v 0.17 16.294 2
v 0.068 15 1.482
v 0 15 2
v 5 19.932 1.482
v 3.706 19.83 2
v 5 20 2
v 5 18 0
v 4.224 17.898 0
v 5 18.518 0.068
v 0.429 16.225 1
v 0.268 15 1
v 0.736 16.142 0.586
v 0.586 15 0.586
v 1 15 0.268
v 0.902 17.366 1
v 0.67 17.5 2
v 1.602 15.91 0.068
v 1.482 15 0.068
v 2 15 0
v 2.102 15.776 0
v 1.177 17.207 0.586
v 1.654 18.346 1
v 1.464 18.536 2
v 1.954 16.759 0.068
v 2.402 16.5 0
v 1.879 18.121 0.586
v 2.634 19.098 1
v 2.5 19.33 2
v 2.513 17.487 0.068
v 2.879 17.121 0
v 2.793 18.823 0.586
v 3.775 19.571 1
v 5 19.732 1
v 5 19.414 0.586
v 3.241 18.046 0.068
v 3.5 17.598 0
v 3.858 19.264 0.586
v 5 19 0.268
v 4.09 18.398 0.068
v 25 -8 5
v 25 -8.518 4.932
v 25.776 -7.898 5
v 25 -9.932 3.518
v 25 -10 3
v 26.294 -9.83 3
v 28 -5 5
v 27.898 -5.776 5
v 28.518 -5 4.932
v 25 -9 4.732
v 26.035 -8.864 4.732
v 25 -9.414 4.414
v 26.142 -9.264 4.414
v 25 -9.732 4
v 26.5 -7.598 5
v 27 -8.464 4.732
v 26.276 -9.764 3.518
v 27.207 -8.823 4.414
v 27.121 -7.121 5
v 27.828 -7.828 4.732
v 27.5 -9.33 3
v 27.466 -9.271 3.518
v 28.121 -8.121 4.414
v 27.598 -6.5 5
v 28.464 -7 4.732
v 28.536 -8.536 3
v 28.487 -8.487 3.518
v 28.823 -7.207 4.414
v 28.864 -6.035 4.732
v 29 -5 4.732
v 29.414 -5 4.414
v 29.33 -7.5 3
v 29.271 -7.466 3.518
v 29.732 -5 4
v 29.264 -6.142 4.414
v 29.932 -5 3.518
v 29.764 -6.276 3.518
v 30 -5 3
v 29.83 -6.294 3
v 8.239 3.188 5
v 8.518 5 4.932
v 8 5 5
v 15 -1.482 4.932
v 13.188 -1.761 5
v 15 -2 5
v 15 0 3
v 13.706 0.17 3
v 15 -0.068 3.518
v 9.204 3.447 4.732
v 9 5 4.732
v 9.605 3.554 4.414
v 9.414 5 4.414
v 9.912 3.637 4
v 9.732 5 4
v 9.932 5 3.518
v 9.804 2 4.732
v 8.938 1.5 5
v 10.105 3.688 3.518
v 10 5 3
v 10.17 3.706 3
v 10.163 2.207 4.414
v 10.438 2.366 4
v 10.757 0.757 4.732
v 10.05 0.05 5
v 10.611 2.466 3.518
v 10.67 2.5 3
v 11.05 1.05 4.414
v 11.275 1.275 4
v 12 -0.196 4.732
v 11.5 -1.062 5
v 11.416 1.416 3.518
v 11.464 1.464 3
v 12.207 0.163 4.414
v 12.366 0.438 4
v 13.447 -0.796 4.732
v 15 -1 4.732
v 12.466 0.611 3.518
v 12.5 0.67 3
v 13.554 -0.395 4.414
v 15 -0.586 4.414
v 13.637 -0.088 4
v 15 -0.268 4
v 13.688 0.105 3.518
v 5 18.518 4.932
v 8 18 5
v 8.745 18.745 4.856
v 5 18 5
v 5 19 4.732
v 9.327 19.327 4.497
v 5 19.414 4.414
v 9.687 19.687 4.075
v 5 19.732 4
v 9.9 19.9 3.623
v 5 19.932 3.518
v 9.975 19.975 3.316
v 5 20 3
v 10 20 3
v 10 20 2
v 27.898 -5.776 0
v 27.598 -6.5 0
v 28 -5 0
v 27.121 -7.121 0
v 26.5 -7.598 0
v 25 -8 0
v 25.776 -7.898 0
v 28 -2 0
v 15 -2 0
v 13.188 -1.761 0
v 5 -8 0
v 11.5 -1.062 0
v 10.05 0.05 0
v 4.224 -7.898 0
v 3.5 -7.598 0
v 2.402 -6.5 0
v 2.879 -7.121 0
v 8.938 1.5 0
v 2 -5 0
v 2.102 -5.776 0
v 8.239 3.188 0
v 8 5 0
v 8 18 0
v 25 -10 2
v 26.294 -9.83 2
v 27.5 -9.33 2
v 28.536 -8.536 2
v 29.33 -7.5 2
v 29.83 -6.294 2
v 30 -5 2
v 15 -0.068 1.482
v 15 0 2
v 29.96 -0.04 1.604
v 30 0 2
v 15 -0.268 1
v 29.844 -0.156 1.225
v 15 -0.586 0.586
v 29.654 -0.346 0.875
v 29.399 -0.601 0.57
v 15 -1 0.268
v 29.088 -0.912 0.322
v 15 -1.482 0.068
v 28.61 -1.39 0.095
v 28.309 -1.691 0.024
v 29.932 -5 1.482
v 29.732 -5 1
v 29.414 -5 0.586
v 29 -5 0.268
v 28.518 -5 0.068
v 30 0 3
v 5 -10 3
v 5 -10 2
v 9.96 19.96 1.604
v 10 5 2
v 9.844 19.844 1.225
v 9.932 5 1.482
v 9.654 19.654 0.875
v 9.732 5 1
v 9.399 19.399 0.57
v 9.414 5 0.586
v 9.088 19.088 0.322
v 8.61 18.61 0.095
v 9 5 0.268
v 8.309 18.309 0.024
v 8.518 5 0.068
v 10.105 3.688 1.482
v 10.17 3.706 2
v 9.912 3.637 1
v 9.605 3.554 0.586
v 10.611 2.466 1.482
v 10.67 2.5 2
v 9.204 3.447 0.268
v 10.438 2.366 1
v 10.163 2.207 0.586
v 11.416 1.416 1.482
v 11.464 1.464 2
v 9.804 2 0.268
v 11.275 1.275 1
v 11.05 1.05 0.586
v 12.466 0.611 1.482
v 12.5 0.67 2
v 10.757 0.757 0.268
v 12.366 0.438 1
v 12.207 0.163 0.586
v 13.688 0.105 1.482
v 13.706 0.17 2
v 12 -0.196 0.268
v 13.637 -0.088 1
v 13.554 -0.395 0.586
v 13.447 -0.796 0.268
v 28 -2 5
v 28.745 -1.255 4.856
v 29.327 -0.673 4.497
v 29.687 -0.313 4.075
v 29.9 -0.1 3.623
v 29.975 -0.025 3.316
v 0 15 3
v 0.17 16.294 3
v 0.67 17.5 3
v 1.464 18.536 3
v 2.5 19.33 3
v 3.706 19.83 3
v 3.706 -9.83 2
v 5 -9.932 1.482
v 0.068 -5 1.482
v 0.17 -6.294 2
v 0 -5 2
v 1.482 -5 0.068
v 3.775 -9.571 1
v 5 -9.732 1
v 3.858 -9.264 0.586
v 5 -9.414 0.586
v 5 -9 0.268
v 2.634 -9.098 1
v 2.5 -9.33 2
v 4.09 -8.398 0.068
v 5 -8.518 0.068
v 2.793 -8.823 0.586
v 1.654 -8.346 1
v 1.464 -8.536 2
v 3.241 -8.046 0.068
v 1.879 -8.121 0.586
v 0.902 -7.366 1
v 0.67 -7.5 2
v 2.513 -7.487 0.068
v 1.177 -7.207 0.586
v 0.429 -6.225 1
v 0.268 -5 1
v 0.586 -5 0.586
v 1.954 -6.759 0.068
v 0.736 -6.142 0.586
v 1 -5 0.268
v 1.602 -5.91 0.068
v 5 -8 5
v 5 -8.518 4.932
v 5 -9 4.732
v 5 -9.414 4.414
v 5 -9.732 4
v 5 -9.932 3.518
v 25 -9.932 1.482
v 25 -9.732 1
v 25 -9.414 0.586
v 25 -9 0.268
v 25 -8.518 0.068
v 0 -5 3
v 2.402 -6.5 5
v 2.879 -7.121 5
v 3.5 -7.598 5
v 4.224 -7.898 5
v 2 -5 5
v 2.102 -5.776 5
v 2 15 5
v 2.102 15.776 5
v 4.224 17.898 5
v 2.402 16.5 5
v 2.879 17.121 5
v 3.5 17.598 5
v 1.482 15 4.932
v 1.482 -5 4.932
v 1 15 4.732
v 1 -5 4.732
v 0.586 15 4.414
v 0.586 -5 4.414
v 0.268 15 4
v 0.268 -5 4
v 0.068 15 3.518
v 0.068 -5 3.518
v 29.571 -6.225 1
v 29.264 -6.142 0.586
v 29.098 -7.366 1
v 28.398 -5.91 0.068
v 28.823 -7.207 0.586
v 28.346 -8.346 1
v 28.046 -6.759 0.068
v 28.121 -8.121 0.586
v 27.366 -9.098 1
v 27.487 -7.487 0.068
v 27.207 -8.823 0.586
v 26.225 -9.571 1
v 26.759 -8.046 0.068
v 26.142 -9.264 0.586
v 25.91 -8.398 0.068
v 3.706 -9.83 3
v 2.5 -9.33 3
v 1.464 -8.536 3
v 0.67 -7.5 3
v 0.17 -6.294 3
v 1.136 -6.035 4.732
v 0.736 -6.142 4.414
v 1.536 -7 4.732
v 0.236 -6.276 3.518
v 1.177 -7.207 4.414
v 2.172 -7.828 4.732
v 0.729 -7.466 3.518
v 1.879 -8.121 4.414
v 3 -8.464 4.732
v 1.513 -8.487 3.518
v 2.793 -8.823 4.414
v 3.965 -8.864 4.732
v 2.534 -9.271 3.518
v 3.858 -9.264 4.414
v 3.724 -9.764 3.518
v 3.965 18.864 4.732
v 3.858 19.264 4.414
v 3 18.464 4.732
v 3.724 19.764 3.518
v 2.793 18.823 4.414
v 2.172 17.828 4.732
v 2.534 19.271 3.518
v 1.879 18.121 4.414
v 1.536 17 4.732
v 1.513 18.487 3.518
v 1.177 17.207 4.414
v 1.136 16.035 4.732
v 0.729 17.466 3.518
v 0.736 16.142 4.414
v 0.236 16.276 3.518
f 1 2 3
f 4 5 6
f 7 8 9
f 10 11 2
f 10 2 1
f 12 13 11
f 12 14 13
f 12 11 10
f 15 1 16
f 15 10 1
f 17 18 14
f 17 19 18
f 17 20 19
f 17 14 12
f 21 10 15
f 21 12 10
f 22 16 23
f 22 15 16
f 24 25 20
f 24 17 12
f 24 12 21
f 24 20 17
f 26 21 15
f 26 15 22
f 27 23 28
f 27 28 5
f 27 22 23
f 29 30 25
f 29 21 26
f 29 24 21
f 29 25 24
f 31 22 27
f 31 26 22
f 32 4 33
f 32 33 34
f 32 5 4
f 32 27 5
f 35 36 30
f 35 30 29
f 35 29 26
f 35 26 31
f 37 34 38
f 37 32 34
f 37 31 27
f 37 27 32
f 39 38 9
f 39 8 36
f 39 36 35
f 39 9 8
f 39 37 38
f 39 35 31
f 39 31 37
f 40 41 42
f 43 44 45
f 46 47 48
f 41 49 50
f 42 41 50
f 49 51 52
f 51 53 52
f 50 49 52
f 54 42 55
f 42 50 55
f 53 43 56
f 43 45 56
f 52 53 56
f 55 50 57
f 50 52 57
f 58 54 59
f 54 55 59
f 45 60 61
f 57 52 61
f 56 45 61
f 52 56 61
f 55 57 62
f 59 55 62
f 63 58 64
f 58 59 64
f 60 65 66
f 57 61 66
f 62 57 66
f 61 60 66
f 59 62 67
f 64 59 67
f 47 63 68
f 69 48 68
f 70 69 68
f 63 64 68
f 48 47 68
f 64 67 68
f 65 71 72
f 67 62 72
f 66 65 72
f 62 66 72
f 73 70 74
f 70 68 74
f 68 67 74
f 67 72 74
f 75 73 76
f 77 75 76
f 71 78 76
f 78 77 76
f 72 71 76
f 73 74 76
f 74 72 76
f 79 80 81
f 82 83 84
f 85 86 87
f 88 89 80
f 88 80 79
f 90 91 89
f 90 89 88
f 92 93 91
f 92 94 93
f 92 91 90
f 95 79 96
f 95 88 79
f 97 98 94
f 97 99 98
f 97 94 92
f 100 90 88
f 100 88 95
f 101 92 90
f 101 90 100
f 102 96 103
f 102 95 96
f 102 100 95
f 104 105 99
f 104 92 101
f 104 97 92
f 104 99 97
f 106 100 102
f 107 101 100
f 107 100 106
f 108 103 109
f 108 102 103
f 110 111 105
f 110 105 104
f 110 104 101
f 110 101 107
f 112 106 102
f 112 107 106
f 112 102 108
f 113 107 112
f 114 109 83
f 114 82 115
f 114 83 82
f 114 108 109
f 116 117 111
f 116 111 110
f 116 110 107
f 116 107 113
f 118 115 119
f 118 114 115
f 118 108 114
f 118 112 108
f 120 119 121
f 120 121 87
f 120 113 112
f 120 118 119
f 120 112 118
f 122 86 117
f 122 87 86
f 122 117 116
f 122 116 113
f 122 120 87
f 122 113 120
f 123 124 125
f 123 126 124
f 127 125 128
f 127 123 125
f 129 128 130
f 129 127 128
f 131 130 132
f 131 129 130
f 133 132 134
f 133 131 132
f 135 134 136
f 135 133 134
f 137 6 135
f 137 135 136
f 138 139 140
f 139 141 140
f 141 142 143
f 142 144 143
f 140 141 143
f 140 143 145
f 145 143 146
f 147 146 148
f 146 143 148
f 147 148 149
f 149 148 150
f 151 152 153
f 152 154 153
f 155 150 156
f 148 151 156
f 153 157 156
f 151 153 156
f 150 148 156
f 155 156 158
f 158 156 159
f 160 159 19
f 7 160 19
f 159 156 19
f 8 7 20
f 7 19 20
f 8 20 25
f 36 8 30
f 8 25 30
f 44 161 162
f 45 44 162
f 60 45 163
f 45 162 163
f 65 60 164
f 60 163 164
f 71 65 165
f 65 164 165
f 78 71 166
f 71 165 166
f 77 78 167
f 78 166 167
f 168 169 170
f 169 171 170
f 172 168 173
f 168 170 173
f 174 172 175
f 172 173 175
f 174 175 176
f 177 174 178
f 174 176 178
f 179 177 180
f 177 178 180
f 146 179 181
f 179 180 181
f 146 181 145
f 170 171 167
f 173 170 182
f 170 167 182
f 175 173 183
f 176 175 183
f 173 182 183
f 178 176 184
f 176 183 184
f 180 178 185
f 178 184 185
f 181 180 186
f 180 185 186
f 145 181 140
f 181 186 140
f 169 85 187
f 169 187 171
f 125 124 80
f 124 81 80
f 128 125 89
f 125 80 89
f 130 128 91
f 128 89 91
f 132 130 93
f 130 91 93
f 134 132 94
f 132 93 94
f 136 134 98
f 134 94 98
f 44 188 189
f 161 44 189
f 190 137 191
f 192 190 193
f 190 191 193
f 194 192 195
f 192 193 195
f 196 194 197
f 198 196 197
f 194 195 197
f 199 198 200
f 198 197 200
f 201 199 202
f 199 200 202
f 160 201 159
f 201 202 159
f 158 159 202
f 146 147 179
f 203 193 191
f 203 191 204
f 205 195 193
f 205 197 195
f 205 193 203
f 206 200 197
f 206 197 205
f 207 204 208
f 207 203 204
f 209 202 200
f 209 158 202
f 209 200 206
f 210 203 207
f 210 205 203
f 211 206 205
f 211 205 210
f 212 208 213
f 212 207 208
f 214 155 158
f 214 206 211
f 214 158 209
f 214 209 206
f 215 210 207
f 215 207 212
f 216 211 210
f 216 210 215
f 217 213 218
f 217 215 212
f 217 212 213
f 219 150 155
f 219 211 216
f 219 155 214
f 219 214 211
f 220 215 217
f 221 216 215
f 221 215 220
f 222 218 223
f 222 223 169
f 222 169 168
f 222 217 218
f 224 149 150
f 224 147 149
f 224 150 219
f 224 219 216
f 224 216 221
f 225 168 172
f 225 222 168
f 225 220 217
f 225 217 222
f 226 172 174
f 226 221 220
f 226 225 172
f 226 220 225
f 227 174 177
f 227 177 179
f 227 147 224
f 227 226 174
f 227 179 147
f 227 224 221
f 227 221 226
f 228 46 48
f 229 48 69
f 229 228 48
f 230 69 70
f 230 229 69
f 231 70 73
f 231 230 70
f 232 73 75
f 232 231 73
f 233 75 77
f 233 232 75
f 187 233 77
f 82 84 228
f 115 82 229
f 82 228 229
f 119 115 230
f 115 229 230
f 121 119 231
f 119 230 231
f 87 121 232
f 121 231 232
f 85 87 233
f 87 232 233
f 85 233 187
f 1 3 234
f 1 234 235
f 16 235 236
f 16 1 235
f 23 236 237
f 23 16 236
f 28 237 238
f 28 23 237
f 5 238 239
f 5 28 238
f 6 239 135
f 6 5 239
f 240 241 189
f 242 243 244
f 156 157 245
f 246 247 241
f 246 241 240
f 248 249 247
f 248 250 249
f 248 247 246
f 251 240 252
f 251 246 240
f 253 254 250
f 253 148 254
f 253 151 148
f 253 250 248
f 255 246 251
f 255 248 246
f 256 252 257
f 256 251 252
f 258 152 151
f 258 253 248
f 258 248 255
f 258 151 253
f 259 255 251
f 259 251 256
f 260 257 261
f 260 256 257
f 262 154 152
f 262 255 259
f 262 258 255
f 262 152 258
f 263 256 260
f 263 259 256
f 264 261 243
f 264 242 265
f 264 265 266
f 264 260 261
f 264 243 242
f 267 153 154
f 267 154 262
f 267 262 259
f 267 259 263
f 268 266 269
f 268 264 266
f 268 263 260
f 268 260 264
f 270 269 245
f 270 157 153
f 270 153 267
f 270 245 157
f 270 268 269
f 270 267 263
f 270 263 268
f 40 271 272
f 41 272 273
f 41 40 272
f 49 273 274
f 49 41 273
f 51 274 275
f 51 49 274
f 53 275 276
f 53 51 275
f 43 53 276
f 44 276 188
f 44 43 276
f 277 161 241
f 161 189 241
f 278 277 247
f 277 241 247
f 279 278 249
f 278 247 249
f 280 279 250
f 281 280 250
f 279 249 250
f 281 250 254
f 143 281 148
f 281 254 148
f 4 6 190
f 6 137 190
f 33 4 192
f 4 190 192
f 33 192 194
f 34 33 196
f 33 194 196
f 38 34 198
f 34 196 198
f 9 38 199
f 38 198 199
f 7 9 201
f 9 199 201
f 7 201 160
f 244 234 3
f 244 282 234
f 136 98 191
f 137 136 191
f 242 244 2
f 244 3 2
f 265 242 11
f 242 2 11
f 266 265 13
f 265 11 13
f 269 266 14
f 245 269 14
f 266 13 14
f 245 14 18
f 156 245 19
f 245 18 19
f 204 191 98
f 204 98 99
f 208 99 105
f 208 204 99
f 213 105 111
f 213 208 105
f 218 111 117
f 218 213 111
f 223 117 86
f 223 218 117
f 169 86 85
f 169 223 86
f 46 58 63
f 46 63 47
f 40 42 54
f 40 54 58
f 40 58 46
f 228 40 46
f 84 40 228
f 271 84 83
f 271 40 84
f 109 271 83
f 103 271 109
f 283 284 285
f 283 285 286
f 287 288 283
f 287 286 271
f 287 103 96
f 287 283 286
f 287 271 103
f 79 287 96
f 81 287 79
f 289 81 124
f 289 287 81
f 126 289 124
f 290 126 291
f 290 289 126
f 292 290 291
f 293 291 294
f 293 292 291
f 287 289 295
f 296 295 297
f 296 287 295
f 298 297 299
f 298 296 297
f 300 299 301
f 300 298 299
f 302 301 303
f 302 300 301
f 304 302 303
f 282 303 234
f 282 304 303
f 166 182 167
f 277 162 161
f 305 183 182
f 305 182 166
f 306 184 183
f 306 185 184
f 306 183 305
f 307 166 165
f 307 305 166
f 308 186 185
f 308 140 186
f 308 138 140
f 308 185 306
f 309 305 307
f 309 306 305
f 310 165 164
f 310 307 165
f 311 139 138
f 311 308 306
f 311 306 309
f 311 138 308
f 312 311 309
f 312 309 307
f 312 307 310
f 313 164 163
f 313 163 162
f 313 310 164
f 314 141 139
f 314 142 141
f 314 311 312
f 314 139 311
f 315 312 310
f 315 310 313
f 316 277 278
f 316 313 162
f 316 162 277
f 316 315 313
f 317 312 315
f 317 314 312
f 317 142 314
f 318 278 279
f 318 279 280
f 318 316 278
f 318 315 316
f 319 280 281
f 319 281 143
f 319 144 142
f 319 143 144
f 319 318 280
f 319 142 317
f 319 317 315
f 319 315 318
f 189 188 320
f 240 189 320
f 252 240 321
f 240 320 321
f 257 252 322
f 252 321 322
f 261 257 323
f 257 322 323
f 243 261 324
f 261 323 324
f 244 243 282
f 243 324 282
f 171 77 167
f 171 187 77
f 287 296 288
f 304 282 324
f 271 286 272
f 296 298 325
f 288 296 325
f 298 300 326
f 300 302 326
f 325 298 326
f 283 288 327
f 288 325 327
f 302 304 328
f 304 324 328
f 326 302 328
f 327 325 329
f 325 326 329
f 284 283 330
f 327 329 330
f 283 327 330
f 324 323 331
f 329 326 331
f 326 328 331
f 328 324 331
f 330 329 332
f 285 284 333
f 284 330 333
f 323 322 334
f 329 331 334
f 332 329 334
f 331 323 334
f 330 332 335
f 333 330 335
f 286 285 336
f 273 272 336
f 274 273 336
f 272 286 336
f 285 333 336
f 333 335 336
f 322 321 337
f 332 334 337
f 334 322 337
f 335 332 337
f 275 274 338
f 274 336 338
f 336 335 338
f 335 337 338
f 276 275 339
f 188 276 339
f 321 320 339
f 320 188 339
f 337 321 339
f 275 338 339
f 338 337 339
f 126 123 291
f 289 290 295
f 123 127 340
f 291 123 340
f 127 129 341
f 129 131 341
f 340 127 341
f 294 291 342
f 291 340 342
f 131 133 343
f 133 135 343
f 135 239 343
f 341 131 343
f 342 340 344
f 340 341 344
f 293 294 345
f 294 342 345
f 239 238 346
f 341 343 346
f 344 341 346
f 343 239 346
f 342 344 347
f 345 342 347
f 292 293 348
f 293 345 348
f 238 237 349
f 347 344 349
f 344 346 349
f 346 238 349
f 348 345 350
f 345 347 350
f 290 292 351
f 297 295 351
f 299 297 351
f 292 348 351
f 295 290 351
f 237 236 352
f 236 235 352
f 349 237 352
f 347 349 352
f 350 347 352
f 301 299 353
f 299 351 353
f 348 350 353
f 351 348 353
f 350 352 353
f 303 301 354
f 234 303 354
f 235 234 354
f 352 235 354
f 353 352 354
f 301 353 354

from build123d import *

# Parameters (mm, degrees)
SKETCH1_W           = 10
SKETCH1_H           = 10
BOSS_EXTRUDE1_DEPTH = 5
SKETCH2_W           = 10
SKETCH2_H           = 5
BOSS_EXTRUDE2_DEPTH = 20
SKETCH3_W           = 5
SKETCH3_H           = 10
BOSS_EXTRUDE3_DEPTH = 20
FILLET1_R           = 5
FILLET2_R           = 2


with BuildPart() as part:
    # Sketch1 → Boss-Extrude1 (new body)
    with BuildSketch(Plane.XY):
        with Locations((5, -5)):
            Rectangle(SKETCH1_W, SKETCH1_H)
    extrude(amount=BOSS_EXTRUDE1_DEPTH)

    # Sketch2 → Boss-Extrude2 (add)
    with BuildSketch(Plane(origin=(0, 0, 0), x_dir=(1, 0, 0), z_dir=(0, 1, 0))):
        with Locations((5, -2.5)):
            Rectangle(SKETCH2_W, SKETCH2_H)
    extrude(amount=BOSS_EXTRUDE2_DEPTH)

    # Sketch3 → Boss-Extrude3 (add)
    with BuildSketch(Plane(origin=(10, 0, 0), x_dir=(0, 0, -1), z_dir=(1, 0, 0))):
        with Locations((-2.5, -5)):
            Rectangle(SKETCH3_W, SKETCH3_H)
    extrude(amount=BOSS_EXTRUDE3_DEPTH)

    # Fillet1
    fillet1_edges = [part.edges().sort_by_distance(p)[0] for p in [
        (0, 20, 2.5),
        (10, 0, 2.5),
        (30, -10, 2.5),
        (0, -10, 2.5),
    ]]
    fillet(fillet1_edges, radius=FILLET1_R)

    # Fillet2
    fillet2_edges = [part.edges().sort_by_distance(p)[0] for p in [
        (7.5, 20, 0),
        (22.5, 0, 5),
        (22.5, 0, 0),
        (30, -2.5, 5),
        (30, -2.5, 0),
        (0, 5, 0),
        (10, 12.5, 0),
        (15, -10, 0),
        (1.464466094, -8.535533906, 0),
        (1.464466094, 18.535533906, 0),
        (28.535533906, -8.535533906, 0),
        (15, -10, 5),
        (0, 5, 5),
        (10, 12.5, 5),
        (7.5, 20, 5),
        (1.464466094, -8.535533906, 5),
        (1.464466094, 18.535533906, 5),
        (28.535533906, -8.535533906, 5),
        (11.464466094, 1.464466094, 5),
        (11.464466094, 1.464466094, 0),
    ]]
    fillet(fillet2_edges, radius=FILLET2_R)


solid = part.part
